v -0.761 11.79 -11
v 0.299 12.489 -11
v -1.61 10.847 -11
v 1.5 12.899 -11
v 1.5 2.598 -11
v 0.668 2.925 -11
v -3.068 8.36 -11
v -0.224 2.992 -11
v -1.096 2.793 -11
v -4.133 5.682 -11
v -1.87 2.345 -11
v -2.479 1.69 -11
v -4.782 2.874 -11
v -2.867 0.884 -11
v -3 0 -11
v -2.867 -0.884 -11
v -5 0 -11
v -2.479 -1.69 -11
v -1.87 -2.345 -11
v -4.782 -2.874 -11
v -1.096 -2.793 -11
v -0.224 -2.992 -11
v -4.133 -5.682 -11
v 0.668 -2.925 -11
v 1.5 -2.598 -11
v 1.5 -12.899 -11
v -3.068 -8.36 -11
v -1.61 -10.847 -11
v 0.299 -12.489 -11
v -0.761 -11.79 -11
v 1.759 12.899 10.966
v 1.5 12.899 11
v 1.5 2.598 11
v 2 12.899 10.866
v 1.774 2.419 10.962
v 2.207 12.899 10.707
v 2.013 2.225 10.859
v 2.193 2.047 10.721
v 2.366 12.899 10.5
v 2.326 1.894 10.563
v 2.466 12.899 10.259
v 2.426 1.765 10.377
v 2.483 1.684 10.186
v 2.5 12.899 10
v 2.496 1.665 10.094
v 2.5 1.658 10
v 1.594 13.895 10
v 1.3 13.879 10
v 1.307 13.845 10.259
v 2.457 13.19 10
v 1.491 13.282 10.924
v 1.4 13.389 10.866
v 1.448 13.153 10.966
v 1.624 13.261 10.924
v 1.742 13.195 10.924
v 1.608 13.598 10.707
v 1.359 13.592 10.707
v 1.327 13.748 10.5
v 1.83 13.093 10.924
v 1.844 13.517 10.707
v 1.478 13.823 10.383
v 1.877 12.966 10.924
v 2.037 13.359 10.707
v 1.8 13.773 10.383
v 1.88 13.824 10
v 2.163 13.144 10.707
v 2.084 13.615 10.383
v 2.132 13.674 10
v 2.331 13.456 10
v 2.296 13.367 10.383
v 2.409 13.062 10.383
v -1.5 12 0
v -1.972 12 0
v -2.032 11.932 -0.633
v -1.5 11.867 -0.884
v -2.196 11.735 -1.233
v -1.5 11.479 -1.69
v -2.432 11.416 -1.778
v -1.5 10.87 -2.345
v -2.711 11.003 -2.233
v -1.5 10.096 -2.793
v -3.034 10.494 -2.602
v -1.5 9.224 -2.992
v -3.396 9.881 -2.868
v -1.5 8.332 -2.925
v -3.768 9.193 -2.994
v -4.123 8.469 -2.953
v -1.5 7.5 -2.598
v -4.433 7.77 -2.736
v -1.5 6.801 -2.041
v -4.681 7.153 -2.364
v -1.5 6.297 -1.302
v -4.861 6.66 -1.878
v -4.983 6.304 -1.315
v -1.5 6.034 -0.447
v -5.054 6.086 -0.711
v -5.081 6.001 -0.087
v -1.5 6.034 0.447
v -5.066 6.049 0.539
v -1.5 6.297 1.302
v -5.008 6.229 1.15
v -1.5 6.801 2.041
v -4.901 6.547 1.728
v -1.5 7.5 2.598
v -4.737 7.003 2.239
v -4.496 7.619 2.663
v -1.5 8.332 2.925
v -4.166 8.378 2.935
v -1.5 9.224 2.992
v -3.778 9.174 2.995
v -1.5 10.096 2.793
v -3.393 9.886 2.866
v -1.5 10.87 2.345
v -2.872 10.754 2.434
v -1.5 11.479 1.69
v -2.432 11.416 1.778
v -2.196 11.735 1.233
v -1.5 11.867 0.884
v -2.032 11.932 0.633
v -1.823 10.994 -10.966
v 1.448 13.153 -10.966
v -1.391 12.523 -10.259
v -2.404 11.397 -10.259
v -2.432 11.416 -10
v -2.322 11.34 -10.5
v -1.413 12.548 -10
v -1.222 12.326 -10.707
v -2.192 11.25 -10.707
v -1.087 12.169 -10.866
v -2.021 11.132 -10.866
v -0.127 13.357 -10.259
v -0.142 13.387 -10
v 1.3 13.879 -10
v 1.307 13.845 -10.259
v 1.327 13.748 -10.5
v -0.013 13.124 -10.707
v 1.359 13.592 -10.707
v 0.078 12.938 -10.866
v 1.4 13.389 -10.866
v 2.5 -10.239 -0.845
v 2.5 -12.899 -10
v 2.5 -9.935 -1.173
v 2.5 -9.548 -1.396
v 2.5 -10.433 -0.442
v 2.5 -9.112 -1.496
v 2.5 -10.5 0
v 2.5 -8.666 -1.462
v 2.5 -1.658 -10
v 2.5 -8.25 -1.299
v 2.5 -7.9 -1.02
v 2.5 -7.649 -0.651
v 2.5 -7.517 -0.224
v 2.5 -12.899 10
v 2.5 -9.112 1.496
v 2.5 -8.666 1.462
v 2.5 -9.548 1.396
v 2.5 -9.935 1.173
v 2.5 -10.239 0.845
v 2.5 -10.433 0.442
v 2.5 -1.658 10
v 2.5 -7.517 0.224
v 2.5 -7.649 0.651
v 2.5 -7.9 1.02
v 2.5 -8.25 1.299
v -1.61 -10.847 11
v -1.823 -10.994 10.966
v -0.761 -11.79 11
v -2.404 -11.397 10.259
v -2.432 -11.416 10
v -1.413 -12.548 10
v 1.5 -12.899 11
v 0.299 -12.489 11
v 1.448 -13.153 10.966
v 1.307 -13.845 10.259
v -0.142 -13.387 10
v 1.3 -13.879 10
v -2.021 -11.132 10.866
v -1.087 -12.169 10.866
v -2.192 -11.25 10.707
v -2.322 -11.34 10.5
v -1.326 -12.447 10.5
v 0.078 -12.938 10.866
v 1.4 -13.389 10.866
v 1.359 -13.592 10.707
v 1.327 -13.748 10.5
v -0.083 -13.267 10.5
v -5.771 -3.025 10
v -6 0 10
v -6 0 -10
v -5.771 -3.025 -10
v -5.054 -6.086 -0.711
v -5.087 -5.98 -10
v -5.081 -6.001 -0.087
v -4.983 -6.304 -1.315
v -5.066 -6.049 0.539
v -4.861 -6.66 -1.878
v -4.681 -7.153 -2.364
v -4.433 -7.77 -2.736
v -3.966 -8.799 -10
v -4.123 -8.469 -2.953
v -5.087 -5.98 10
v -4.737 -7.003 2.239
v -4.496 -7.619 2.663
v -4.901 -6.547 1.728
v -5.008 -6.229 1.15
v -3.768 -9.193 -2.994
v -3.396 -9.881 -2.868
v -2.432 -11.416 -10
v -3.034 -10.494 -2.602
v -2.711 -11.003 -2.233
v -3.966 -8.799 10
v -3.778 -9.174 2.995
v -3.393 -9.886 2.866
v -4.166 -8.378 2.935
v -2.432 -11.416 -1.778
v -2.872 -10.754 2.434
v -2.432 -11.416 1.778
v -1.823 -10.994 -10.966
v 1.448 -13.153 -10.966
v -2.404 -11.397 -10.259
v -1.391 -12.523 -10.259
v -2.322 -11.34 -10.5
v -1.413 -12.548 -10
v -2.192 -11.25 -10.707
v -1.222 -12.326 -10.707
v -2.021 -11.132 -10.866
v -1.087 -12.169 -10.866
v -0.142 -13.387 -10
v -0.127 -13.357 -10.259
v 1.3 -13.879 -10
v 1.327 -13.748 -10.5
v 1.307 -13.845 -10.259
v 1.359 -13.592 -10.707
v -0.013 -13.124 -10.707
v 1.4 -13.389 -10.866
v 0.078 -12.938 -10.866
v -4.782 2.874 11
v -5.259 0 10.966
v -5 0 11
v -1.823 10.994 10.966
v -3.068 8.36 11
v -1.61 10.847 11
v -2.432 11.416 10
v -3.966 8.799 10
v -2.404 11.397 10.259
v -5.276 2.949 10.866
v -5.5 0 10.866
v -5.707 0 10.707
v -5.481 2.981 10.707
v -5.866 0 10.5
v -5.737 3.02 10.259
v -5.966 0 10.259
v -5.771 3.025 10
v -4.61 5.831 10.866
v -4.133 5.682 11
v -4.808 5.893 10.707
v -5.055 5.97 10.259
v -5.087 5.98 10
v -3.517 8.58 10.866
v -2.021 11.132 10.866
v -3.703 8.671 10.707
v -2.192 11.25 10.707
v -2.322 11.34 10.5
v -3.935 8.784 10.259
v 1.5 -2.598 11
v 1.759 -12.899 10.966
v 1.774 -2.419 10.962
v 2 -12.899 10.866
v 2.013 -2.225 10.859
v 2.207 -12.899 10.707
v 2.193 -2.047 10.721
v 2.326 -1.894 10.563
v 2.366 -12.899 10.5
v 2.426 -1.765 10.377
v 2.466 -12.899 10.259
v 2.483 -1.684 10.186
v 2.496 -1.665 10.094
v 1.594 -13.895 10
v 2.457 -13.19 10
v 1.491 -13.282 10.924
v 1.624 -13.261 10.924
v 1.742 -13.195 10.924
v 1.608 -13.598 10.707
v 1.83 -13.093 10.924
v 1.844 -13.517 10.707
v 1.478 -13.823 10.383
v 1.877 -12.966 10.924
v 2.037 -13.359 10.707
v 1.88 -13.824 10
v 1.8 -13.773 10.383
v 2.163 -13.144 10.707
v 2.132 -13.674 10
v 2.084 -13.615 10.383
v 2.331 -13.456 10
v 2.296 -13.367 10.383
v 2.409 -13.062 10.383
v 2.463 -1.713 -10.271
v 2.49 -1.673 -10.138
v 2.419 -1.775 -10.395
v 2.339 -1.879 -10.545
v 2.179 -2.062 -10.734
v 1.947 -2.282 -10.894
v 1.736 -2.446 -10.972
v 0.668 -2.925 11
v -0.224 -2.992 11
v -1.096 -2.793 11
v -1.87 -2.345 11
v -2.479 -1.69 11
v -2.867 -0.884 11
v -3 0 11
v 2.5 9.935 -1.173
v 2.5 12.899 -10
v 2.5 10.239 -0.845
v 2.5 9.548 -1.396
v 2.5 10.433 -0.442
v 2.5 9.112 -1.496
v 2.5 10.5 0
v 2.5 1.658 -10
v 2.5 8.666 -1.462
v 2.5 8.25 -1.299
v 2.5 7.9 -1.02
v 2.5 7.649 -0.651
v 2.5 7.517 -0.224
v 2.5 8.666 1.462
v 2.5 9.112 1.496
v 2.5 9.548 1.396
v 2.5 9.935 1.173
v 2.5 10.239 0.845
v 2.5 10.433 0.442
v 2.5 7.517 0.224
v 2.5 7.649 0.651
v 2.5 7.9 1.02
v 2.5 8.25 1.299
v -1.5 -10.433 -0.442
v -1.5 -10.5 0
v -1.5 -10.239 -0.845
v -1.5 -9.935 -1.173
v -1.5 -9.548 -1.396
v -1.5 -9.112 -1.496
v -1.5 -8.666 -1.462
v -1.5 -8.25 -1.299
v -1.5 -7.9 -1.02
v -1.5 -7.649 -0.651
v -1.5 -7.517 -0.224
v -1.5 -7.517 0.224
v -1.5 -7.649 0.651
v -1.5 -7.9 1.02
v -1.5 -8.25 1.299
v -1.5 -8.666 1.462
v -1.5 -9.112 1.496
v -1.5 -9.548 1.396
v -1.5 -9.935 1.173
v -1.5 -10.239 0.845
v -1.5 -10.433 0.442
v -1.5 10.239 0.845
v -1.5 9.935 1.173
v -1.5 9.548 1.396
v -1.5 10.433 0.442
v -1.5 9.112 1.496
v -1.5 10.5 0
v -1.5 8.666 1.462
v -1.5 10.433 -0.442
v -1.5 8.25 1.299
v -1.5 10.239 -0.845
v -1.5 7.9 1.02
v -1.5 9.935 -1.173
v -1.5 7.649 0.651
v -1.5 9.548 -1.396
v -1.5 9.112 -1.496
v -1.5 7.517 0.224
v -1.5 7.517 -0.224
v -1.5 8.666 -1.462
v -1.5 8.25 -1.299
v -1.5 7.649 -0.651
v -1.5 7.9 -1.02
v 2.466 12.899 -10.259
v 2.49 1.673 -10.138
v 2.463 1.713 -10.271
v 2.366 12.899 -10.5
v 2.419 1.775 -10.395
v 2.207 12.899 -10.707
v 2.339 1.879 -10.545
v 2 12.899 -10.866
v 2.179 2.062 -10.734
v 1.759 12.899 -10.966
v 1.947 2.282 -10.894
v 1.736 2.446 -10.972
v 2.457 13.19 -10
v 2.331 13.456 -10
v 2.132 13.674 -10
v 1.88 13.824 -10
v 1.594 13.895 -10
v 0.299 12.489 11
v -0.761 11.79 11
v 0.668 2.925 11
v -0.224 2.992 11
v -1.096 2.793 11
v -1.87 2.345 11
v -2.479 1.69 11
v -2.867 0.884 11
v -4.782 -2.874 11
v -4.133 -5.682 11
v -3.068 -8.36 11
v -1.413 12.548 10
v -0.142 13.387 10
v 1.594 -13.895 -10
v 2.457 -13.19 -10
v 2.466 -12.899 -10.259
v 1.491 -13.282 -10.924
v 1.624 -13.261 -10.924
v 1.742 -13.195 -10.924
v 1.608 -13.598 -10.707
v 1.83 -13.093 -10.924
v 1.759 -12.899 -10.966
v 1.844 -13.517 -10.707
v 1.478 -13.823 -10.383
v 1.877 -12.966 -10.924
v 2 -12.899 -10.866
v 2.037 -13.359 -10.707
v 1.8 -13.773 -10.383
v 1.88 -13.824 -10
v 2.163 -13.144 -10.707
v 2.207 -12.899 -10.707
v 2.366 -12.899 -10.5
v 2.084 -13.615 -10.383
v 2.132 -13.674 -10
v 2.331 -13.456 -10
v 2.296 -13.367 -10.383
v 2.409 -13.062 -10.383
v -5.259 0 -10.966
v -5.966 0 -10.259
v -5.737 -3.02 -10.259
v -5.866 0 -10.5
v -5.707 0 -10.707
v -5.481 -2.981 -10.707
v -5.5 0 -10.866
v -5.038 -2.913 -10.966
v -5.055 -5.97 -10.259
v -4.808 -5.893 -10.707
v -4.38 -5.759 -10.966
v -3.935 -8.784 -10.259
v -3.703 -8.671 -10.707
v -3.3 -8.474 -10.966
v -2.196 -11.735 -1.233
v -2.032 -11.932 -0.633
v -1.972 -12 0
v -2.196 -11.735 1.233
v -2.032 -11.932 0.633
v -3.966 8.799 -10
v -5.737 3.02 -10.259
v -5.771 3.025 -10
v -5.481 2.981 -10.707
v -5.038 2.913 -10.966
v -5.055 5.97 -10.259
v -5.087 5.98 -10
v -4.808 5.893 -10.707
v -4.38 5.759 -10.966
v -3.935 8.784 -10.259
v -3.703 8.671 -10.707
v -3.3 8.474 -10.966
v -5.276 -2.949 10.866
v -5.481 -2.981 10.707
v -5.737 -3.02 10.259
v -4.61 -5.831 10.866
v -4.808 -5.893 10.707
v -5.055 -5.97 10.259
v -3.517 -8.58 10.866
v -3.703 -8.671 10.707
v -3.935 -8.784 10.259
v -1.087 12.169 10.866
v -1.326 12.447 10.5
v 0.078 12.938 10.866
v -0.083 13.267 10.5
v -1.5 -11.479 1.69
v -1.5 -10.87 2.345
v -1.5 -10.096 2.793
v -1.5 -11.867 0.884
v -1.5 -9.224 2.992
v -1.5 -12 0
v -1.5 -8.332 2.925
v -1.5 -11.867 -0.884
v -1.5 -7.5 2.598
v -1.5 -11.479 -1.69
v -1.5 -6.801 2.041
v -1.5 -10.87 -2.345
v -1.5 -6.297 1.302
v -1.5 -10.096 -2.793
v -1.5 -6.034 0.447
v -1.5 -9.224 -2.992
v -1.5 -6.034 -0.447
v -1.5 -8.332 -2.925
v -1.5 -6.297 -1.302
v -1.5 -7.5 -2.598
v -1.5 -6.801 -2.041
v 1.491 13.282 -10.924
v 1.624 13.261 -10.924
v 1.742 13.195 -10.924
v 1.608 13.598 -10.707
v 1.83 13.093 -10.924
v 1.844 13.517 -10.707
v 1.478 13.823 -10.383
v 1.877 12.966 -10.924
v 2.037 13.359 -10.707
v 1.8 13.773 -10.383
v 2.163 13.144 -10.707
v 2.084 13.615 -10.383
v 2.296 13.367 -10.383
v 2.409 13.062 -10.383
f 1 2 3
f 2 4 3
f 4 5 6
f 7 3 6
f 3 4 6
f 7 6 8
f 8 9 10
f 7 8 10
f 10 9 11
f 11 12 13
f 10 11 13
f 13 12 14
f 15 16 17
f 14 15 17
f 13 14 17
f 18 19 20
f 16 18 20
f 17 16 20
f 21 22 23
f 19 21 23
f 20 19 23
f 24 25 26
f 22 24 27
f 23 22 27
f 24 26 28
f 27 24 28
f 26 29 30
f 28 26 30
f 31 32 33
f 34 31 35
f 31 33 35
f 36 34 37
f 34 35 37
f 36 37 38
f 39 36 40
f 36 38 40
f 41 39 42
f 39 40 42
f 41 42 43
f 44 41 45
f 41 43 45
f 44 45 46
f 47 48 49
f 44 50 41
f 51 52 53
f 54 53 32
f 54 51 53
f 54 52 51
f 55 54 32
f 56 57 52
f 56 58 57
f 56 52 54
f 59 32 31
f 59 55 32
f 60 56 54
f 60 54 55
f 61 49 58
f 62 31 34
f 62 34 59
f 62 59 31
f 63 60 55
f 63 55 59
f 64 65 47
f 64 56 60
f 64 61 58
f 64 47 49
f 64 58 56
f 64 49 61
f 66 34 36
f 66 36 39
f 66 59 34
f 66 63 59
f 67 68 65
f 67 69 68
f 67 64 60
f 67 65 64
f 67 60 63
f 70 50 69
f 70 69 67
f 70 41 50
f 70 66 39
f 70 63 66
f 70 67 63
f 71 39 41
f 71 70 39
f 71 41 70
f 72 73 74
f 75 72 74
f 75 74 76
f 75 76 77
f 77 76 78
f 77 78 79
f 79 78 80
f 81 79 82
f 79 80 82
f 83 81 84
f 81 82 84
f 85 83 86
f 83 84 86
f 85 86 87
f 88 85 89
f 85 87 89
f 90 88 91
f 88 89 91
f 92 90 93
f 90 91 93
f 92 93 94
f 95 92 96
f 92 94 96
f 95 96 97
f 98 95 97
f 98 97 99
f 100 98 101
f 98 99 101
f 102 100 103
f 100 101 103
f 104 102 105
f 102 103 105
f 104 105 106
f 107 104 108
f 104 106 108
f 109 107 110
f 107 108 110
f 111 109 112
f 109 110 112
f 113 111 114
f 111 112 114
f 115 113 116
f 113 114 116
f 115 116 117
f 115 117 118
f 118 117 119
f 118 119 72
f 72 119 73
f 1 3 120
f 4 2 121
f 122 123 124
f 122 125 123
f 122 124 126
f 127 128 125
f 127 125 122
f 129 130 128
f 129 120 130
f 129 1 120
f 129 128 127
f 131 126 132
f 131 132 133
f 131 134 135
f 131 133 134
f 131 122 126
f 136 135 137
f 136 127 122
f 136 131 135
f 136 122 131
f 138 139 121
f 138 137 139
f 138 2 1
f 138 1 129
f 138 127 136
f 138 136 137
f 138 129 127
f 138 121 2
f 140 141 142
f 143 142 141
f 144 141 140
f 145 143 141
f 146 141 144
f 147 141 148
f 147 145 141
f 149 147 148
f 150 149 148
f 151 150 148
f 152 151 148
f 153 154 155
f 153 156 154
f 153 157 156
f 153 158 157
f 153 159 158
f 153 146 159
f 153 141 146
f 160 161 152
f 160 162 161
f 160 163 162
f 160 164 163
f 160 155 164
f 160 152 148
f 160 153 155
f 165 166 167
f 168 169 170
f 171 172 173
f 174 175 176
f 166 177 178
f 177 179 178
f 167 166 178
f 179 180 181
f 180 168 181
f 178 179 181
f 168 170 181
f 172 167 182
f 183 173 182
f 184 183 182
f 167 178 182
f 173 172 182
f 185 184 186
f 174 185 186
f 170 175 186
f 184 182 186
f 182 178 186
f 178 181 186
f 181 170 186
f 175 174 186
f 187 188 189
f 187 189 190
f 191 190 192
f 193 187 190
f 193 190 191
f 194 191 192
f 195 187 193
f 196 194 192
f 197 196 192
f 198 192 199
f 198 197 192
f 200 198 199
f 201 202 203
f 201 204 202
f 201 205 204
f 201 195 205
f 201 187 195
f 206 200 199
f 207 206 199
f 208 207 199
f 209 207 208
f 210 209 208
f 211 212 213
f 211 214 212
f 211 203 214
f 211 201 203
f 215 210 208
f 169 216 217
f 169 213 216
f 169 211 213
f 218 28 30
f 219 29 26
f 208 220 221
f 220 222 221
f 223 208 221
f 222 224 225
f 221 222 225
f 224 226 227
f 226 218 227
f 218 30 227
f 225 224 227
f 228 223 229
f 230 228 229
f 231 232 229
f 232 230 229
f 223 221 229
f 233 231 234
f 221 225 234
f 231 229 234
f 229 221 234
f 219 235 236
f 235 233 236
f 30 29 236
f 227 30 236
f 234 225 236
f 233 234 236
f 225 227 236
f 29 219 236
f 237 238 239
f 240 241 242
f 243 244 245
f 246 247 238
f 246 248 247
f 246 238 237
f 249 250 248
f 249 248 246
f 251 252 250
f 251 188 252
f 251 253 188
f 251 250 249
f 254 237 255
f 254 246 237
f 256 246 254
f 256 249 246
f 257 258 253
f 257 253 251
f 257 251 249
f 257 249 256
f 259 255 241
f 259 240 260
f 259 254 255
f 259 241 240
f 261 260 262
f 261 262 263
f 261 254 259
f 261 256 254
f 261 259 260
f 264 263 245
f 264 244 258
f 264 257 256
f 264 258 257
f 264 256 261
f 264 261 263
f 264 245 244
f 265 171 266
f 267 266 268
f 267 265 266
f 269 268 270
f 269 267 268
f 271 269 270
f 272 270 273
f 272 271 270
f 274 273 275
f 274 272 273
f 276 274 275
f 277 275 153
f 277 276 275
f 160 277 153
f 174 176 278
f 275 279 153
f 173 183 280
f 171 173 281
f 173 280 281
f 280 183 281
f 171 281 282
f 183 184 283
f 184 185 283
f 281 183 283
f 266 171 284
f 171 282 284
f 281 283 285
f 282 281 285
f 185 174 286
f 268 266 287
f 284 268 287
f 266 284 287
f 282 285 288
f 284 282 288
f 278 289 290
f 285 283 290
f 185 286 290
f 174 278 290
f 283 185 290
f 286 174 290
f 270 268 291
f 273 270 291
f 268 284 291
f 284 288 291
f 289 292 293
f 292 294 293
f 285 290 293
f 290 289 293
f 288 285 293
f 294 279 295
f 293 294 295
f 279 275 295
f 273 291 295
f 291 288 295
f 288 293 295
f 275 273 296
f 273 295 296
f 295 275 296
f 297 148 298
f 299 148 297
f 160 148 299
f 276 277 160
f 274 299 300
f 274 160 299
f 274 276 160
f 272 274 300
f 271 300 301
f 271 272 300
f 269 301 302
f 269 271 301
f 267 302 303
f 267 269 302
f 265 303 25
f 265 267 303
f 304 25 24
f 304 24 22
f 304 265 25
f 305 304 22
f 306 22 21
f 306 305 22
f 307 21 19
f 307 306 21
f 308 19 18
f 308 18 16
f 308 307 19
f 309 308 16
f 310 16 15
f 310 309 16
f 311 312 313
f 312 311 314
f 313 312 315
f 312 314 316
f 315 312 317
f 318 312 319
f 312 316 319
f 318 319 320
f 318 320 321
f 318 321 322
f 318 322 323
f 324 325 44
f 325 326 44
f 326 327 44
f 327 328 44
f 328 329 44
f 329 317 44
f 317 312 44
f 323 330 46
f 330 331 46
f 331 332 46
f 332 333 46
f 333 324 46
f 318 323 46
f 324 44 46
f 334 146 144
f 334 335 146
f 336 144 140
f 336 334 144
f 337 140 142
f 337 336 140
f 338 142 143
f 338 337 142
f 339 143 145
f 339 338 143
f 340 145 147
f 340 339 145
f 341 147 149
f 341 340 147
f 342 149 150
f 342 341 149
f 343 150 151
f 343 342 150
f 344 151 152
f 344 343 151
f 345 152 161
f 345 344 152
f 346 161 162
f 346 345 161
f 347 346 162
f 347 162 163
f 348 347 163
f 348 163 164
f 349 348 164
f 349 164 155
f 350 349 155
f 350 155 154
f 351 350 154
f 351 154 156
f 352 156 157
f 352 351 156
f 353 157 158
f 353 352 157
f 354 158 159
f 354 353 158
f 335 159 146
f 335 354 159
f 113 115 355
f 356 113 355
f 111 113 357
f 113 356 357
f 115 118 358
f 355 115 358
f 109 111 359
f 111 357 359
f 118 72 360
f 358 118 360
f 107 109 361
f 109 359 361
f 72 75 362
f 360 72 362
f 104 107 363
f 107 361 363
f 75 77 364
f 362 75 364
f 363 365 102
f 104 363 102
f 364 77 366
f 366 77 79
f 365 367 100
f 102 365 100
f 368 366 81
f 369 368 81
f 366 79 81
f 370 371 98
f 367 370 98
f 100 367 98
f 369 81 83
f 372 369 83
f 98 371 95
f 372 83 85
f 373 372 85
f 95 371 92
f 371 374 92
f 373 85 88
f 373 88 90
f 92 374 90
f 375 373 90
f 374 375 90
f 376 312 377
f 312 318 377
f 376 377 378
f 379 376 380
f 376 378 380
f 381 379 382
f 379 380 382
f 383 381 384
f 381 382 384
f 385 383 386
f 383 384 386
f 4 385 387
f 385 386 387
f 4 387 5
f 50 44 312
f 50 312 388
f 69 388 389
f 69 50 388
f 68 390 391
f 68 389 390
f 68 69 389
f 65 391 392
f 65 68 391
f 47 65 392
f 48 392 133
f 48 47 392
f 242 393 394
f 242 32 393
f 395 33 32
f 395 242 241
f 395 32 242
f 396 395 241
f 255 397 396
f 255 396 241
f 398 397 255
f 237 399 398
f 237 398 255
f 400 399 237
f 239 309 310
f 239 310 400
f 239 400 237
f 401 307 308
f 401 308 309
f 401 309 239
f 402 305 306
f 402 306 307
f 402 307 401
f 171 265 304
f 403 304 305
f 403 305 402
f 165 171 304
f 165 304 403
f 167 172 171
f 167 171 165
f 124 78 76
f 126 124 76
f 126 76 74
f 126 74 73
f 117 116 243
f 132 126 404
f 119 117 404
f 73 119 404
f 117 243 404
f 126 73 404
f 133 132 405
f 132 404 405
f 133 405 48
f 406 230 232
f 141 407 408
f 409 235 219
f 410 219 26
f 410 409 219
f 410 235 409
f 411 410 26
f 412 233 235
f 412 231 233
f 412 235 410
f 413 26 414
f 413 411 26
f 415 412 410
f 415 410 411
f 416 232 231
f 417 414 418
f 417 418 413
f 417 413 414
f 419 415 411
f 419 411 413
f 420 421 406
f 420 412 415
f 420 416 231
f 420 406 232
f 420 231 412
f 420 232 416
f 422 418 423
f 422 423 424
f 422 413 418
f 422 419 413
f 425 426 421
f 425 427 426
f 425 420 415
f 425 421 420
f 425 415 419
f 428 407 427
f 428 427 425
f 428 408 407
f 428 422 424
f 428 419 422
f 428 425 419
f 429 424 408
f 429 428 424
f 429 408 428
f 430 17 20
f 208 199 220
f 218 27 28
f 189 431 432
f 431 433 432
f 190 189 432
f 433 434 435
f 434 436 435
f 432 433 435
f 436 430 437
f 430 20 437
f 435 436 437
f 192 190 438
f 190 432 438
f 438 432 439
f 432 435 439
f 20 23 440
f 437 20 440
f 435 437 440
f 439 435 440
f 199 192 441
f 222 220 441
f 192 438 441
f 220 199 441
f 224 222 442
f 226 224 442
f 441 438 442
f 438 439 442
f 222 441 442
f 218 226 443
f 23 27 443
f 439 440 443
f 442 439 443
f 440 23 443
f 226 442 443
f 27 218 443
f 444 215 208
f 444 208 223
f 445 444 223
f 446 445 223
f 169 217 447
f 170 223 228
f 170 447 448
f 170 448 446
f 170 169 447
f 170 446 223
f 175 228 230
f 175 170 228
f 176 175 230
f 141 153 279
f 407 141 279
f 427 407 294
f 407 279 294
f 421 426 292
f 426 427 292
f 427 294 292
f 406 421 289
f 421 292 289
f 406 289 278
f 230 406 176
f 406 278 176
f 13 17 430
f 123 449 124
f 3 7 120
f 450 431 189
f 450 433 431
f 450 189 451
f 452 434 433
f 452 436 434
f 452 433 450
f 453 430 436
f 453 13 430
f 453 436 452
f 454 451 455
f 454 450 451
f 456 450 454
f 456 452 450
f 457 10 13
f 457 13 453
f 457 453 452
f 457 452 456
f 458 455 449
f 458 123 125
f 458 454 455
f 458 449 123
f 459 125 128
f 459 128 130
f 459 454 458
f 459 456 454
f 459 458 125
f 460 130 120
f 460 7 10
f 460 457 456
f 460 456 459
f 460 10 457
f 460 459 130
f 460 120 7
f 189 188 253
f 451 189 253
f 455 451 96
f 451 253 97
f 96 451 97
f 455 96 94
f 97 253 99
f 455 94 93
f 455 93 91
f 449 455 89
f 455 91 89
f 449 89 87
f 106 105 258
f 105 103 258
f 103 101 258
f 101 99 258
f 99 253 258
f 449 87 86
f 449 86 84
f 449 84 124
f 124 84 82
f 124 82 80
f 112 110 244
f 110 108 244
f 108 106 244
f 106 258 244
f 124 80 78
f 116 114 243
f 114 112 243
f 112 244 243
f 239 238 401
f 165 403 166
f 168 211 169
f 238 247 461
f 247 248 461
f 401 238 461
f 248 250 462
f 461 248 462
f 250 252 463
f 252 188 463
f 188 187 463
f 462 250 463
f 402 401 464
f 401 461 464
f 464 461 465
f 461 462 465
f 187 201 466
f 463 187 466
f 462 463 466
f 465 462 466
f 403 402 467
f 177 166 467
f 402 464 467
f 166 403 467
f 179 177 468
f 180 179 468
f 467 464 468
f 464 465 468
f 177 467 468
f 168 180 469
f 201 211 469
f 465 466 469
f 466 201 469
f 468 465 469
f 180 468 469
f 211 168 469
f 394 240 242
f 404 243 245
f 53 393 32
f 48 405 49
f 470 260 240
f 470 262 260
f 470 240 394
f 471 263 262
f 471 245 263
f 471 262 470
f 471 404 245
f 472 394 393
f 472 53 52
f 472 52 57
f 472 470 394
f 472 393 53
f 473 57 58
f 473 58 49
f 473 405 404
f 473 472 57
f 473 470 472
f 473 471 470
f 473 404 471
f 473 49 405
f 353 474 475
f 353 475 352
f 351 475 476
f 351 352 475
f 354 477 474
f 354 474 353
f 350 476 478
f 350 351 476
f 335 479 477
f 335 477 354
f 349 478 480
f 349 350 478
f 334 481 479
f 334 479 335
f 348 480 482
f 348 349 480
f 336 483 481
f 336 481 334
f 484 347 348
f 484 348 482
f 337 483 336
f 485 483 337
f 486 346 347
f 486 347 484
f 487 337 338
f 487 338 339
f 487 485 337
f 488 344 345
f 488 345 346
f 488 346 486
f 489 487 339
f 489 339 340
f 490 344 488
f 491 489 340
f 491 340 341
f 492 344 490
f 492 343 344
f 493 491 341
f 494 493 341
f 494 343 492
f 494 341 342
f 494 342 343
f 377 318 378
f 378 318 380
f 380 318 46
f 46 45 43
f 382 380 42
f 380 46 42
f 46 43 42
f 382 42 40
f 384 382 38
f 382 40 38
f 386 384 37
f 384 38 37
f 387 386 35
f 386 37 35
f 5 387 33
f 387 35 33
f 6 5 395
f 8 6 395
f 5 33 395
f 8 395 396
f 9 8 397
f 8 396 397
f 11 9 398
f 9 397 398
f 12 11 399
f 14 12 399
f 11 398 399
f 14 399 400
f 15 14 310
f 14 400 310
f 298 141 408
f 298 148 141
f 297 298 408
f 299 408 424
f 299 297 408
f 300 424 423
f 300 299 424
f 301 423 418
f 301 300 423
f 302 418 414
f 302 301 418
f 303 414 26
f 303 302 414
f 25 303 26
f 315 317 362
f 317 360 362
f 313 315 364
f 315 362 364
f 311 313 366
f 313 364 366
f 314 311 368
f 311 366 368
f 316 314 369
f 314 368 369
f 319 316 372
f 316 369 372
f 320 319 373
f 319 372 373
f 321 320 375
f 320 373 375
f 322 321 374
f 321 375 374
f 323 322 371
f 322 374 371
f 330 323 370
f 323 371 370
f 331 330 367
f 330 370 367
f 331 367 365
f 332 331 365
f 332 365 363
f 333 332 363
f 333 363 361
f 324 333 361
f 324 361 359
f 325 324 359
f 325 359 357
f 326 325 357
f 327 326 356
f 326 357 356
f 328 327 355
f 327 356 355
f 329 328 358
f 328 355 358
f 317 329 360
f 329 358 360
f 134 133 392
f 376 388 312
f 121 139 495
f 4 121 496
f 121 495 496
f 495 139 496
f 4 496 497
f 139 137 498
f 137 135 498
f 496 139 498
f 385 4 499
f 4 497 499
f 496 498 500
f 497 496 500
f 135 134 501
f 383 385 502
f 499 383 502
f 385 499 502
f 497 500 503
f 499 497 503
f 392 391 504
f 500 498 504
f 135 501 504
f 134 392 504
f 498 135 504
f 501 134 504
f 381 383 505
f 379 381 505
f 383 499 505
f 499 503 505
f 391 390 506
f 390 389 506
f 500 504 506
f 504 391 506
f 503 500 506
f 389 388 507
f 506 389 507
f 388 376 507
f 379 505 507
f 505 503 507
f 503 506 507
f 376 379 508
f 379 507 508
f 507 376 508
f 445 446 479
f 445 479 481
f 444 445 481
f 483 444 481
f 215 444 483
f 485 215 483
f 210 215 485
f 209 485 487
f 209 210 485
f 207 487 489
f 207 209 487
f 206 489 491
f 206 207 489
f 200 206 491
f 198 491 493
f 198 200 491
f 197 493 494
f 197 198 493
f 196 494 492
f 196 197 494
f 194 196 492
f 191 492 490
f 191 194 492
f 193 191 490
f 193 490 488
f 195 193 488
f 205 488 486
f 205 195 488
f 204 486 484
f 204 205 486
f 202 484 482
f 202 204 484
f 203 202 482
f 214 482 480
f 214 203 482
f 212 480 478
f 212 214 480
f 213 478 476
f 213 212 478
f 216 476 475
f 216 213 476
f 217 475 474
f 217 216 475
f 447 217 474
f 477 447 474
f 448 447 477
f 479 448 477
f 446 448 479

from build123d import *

# Parameters (mm, degrees)
BOSS_EXTRU_1_DEPTH = 11
CONG_1_R           = 1


with BuildPart() as part:
    # Esquisse1 → Boss.-Extru.1 (new, symmetric)
    with BuildSketch(Plane.XY):
        with BuildLine():
            Line((-3, 0), (-6, 0))
            ThreePointArc((-6, 0), (-5.08732356, 5.980413612), (-2.432384342, 11.416370107))
            ThreePointArc((-2.432384342, 11.416370107), (-0.284041968, 13.314989212), (2.5, 14))
            Line((2.5, 14), (2.5, 1.658312395))
            ThreePointArc((2.5, 1.658312395), (-0.866025404, 2.872281323), (-3, 0))
        make_face()
    extrude(amount=BOSS_EXTRU_1_DEPTH, both=True)

    # Esquisse2 → Enlèvement de matière-Révolution1 (revolve, cut)
    with BuildSketch(Plane.XY, mode=Mode.PRIVATE) as enl_vement_de_mati_re_r_volution1_sk:
        Polygon((2.5, 7.5), (-1.5, 7.5), (-1.5, 6), (-5.081191808, 6), (-5.081191808, 9), (2.5, 9), align=None)
    revolve(enl_vement_de_mati_re_r_volution1_sk.sketch.rotate(Axis((-5.081191808, 9, 0), (-1, 0, 0)), 180), axis=Axis((-5.081191808, 9, 0), (-1, 0, 0)), mode=Mode.SUBTRACT)

    # Congé1
    cong_1_edges = [part.edges().sort_by_distance(p)[0] for p in [
        (-0.284041968, 13.314989212, 11),
        (-5.08732356, 5.980413612, 11),
        (-5.08732356, 5.980413612, -11),
        (-0.284041968, 13.314989212, -11),
        (2.5, 7.829156198, -11),
        (2.5, 7.829156198, 11),
        (2.5, 14, 0),
    ]]
    fillet(cong_1_edges, radius=CONG_1_R)

    # Symétrie1: part across plane


with BuildPart() as part_1:
    add(part.part)
    add(part.part.mirror(Plane(origin=(-3, 0, 11), x_dir=(0, 0, 1), z_dir=(0, 1, 0))))


solid = part_1.part
